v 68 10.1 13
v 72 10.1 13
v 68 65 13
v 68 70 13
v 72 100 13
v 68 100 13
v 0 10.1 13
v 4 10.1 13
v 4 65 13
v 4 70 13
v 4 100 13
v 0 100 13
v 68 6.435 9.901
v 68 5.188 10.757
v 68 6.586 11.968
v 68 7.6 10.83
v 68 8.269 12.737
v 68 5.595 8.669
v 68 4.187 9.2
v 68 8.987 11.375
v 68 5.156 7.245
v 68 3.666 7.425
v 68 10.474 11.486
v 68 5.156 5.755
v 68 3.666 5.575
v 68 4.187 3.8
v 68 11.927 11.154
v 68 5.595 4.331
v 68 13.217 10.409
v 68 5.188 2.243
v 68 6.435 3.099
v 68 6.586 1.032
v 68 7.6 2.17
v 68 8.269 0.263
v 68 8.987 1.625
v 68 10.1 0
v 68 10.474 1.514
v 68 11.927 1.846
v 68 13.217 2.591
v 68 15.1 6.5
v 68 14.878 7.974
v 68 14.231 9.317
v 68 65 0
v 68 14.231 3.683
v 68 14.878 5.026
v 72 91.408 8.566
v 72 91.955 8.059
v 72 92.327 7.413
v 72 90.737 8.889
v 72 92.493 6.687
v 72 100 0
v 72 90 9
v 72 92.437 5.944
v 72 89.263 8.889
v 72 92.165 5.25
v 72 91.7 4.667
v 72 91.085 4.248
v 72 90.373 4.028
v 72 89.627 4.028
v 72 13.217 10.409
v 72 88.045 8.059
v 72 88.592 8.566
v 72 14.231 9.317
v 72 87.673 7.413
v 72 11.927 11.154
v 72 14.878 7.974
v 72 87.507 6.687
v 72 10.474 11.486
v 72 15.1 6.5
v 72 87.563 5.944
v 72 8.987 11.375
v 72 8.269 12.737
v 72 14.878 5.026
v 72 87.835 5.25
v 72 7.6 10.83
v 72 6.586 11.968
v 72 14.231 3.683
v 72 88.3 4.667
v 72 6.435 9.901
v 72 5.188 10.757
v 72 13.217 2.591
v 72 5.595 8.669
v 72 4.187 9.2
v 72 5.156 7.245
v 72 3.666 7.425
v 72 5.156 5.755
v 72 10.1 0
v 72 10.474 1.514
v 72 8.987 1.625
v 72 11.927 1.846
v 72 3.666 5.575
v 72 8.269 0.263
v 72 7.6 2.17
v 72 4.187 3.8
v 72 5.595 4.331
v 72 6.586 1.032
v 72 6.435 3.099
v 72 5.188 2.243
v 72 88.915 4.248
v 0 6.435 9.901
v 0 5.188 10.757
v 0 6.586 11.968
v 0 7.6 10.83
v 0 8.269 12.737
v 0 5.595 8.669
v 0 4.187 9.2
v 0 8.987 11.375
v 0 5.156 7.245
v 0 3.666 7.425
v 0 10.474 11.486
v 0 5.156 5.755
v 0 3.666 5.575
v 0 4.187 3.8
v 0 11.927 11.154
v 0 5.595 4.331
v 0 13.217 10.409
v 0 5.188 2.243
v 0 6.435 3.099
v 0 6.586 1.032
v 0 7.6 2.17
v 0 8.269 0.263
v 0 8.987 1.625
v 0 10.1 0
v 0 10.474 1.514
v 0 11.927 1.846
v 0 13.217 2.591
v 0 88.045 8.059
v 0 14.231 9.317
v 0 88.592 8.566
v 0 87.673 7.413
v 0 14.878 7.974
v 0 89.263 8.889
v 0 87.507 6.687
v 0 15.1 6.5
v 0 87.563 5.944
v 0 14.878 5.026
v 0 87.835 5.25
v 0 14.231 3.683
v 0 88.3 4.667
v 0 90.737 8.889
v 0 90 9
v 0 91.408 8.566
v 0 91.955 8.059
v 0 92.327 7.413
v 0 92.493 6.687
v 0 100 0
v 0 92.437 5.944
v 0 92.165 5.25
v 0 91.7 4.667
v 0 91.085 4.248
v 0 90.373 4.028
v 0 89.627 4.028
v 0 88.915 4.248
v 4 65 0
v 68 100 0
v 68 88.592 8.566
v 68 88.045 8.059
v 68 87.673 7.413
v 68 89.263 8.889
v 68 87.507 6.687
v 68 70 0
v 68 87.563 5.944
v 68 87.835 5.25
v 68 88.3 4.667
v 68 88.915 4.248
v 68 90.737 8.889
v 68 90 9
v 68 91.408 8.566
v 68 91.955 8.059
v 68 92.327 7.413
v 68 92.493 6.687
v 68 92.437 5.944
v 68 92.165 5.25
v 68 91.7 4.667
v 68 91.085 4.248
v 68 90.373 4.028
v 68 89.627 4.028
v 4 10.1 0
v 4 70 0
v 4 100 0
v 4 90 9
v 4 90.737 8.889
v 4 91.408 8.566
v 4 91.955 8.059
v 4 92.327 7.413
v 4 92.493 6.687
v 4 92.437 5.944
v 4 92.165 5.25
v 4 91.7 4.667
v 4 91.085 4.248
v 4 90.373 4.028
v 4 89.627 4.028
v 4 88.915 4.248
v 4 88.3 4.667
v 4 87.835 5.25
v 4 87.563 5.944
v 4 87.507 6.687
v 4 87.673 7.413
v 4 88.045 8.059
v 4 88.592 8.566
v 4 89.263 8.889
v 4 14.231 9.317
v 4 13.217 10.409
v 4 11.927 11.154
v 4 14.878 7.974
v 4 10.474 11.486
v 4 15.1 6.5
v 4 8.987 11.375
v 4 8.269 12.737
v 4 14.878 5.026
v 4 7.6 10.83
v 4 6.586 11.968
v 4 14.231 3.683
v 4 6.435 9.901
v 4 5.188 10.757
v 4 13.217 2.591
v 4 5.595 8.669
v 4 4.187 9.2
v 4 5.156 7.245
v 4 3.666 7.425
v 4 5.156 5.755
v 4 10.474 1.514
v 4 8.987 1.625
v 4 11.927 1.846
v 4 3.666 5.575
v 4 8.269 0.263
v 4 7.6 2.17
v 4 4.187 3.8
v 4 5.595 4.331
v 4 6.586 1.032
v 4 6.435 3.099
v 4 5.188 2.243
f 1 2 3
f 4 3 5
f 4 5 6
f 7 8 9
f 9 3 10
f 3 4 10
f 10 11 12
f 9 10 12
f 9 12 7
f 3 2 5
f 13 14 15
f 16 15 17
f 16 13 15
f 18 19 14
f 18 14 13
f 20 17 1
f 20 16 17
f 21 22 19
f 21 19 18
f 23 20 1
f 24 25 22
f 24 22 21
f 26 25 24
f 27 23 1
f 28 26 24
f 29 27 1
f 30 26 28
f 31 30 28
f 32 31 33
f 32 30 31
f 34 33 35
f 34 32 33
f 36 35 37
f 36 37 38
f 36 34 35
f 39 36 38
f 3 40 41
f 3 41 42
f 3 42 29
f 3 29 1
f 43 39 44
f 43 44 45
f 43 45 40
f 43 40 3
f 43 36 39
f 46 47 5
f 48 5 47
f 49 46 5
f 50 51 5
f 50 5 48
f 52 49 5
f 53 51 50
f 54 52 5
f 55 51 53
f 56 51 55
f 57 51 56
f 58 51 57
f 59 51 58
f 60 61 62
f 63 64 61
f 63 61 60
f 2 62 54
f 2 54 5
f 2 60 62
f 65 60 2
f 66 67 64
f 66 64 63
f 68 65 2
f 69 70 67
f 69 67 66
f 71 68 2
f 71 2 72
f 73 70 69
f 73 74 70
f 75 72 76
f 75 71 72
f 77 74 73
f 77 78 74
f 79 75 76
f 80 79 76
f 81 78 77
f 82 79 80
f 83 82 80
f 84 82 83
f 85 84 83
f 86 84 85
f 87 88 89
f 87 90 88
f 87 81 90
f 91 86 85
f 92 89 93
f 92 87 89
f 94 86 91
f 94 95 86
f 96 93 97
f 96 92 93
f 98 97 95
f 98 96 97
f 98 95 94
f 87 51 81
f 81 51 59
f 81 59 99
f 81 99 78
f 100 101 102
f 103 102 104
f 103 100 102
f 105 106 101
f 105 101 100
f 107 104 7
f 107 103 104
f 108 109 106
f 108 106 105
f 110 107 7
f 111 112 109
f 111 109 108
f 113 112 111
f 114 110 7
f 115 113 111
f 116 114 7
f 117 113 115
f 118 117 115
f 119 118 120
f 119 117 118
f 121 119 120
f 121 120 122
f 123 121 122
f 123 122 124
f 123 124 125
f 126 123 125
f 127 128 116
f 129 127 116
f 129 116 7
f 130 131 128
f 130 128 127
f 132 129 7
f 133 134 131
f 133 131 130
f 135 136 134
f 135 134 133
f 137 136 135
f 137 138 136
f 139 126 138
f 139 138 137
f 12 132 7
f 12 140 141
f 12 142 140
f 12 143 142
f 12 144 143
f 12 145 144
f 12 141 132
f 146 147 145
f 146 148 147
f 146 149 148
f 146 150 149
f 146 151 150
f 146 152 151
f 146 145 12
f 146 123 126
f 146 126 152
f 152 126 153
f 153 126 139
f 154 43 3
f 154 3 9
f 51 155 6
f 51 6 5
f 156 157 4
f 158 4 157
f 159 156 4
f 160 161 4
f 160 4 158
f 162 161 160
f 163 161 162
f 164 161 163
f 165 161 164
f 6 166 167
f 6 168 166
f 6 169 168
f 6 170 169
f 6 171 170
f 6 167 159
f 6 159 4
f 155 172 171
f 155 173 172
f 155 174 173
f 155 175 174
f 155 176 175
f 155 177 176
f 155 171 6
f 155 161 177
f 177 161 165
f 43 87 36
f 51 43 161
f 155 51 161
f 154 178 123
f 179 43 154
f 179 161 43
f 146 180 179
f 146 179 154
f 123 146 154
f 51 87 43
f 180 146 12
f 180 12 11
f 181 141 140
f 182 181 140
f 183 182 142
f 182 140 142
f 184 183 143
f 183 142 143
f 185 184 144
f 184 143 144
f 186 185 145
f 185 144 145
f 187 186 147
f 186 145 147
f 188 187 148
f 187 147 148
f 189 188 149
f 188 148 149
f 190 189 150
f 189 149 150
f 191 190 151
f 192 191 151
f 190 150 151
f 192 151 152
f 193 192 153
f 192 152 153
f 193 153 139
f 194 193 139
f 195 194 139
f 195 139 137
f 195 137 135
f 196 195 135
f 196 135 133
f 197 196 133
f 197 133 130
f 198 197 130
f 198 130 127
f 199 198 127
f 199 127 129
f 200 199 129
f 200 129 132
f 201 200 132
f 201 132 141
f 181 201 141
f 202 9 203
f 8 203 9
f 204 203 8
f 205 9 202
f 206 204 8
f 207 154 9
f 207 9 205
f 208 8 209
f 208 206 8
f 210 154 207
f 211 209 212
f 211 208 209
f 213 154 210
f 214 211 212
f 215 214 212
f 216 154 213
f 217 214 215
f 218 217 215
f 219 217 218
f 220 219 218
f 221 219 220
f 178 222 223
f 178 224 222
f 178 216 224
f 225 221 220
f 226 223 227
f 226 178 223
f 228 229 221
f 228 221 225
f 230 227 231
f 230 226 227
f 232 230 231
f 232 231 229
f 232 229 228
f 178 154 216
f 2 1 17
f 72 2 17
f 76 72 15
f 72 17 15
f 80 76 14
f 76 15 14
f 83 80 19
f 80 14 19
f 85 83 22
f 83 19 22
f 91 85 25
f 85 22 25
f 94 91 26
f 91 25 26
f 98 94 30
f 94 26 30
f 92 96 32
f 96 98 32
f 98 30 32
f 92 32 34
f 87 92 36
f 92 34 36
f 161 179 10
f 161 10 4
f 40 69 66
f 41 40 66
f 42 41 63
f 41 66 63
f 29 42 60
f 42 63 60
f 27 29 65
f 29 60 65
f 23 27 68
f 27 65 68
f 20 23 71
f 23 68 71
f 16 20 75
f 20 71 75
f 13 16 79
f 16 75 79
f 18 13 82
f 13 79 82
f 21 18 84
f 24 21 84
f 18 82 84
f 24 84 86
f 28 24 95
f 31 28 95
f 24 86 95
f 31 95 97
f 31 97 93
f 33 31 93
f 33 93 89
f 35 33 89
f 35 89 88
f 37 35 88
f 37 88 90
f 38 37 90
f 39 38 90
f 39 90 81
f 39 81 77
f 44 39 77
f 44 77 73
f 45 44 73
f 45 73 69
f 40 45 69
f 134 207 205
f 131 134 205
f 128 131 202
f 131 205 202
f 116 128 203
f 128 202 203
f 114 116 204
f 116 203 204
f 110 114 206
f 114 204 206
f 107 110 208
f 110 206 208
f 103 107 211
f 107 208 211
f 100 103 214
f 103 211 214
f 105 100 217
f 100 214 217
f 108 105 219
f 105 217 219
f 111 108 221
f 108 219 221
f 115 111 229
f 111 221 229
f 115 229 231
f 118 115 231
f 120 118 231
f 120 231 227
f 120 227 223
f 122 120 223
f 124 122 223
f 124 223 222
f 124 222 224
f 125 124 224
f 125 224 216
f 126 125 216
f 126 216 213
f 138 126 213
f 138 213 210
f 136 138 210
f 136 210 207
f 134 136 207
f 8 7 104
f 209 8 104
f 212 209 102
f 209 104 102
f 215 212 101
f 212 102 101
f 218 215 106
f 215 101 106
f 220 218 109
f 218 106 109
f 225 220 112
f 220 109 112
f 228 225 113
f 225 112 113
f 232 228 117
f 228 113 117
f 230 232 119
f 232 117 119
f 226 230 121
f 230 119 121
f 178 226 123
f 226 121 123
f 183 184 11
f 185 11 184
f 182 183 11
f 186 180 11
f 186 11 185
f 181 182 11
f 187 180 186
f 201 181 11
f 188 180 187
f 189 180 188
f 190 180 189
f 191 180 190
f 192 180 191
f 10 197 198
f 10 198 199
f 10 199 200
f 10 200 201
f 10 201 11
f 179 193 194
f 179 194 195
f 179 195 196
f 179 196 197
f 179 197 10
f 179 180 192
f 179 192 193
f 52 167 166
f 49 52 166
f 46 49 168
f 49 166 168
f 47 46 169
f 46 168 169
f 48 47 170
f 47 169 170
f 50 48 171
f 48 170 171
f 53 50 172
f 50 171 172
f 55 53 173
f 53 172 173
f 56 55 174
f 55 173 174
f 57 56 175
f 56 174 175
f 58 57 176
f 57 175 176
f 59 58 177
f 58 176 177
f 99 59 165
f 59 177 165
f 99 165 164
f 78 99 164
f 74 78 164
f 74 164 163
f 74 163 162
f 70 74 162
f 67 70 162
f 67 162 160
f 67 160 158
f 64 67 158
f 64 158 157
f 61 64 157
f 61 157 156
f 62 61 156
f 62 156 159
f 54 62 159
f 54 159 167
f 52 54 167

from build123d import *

# Parameters (mm, degrees)
BOSS_EXTRU_1_DEPTH      = 13
ESQUISSE2_R             = 5
ENL_V_MAT_EXTRU_1_DEPTH = 124.907223357
ESQUISSE3_R             = 2.5
ENL_V_MAT_EXTRU_2_DEPTH = 124.907223357
ENL_V_MAT_EXTRU_4_DEPTH = 124.907223357


with BuildPart() as part:
    # Esquisse1 → Boss.-Extru.1 (new body)
    with BuildSketch(Plane.XY):
        Polygon((0, 0), (0, 100), (4, 100), (4, 70), (68, 70), (68, 100), (72, 100), (72, 0), (68, 0), (68, 65), (4, 65), (4, 0), align=None)
    extrude(amount=BOSS_EXTRU_1_DEPTH)

    # Esquisse2 → Enlèv. mat.-Extru.1 (cut, through all)
    with BuildSketch(Plane(origin=(72, 0, 0), x_dir=(0, 0, -1), z_dir=(1, 0, 0))):
        with Locations(Location((-6.5, 10.1, 0), (0, 0, 90))):
            Circle(ESQUISSE2_R)
    extrude(amount=-ENL_V_MAT_EXTRU_1_DEPTH, mode=Mode.SUBTRACT)

    # Esquisse3 → Enlèv. mat.-Extru.2 (cut, through all)
    with BuildSketch(Plane.ZY):
        with Locations((6.5, 90)):
            Circle(ESQUISSE3_R)
    extrude(amount=-ENL_V_MAT_EXTRU_2_DEPTH, mode=Mode.SUBTRACT)

    # Esquisse5 → Enlèv. mat.-Extru.4 (cut, through all)
    with BuildSketch(Plane.ZY):
        with BuildLine():
            Line((0, 10.1), (0, -2.98091379))
            Line((0, -2.98091379), (15.001453012, -2.98091379))
            Line((15.001453012, -2.98091379), (15.001453012, 10.1))
            Line((15.001453012, 10.1), (13, 10.1))
            ThreePointArc((13, 10.1), (6.5, 3.6), (0, 10.1))
        make_face()
    extrude(amount=-ENL_V_MAT_EXTRU_4_DEPTH, mode=Mode.SUBTRACT)


solid = part.part
